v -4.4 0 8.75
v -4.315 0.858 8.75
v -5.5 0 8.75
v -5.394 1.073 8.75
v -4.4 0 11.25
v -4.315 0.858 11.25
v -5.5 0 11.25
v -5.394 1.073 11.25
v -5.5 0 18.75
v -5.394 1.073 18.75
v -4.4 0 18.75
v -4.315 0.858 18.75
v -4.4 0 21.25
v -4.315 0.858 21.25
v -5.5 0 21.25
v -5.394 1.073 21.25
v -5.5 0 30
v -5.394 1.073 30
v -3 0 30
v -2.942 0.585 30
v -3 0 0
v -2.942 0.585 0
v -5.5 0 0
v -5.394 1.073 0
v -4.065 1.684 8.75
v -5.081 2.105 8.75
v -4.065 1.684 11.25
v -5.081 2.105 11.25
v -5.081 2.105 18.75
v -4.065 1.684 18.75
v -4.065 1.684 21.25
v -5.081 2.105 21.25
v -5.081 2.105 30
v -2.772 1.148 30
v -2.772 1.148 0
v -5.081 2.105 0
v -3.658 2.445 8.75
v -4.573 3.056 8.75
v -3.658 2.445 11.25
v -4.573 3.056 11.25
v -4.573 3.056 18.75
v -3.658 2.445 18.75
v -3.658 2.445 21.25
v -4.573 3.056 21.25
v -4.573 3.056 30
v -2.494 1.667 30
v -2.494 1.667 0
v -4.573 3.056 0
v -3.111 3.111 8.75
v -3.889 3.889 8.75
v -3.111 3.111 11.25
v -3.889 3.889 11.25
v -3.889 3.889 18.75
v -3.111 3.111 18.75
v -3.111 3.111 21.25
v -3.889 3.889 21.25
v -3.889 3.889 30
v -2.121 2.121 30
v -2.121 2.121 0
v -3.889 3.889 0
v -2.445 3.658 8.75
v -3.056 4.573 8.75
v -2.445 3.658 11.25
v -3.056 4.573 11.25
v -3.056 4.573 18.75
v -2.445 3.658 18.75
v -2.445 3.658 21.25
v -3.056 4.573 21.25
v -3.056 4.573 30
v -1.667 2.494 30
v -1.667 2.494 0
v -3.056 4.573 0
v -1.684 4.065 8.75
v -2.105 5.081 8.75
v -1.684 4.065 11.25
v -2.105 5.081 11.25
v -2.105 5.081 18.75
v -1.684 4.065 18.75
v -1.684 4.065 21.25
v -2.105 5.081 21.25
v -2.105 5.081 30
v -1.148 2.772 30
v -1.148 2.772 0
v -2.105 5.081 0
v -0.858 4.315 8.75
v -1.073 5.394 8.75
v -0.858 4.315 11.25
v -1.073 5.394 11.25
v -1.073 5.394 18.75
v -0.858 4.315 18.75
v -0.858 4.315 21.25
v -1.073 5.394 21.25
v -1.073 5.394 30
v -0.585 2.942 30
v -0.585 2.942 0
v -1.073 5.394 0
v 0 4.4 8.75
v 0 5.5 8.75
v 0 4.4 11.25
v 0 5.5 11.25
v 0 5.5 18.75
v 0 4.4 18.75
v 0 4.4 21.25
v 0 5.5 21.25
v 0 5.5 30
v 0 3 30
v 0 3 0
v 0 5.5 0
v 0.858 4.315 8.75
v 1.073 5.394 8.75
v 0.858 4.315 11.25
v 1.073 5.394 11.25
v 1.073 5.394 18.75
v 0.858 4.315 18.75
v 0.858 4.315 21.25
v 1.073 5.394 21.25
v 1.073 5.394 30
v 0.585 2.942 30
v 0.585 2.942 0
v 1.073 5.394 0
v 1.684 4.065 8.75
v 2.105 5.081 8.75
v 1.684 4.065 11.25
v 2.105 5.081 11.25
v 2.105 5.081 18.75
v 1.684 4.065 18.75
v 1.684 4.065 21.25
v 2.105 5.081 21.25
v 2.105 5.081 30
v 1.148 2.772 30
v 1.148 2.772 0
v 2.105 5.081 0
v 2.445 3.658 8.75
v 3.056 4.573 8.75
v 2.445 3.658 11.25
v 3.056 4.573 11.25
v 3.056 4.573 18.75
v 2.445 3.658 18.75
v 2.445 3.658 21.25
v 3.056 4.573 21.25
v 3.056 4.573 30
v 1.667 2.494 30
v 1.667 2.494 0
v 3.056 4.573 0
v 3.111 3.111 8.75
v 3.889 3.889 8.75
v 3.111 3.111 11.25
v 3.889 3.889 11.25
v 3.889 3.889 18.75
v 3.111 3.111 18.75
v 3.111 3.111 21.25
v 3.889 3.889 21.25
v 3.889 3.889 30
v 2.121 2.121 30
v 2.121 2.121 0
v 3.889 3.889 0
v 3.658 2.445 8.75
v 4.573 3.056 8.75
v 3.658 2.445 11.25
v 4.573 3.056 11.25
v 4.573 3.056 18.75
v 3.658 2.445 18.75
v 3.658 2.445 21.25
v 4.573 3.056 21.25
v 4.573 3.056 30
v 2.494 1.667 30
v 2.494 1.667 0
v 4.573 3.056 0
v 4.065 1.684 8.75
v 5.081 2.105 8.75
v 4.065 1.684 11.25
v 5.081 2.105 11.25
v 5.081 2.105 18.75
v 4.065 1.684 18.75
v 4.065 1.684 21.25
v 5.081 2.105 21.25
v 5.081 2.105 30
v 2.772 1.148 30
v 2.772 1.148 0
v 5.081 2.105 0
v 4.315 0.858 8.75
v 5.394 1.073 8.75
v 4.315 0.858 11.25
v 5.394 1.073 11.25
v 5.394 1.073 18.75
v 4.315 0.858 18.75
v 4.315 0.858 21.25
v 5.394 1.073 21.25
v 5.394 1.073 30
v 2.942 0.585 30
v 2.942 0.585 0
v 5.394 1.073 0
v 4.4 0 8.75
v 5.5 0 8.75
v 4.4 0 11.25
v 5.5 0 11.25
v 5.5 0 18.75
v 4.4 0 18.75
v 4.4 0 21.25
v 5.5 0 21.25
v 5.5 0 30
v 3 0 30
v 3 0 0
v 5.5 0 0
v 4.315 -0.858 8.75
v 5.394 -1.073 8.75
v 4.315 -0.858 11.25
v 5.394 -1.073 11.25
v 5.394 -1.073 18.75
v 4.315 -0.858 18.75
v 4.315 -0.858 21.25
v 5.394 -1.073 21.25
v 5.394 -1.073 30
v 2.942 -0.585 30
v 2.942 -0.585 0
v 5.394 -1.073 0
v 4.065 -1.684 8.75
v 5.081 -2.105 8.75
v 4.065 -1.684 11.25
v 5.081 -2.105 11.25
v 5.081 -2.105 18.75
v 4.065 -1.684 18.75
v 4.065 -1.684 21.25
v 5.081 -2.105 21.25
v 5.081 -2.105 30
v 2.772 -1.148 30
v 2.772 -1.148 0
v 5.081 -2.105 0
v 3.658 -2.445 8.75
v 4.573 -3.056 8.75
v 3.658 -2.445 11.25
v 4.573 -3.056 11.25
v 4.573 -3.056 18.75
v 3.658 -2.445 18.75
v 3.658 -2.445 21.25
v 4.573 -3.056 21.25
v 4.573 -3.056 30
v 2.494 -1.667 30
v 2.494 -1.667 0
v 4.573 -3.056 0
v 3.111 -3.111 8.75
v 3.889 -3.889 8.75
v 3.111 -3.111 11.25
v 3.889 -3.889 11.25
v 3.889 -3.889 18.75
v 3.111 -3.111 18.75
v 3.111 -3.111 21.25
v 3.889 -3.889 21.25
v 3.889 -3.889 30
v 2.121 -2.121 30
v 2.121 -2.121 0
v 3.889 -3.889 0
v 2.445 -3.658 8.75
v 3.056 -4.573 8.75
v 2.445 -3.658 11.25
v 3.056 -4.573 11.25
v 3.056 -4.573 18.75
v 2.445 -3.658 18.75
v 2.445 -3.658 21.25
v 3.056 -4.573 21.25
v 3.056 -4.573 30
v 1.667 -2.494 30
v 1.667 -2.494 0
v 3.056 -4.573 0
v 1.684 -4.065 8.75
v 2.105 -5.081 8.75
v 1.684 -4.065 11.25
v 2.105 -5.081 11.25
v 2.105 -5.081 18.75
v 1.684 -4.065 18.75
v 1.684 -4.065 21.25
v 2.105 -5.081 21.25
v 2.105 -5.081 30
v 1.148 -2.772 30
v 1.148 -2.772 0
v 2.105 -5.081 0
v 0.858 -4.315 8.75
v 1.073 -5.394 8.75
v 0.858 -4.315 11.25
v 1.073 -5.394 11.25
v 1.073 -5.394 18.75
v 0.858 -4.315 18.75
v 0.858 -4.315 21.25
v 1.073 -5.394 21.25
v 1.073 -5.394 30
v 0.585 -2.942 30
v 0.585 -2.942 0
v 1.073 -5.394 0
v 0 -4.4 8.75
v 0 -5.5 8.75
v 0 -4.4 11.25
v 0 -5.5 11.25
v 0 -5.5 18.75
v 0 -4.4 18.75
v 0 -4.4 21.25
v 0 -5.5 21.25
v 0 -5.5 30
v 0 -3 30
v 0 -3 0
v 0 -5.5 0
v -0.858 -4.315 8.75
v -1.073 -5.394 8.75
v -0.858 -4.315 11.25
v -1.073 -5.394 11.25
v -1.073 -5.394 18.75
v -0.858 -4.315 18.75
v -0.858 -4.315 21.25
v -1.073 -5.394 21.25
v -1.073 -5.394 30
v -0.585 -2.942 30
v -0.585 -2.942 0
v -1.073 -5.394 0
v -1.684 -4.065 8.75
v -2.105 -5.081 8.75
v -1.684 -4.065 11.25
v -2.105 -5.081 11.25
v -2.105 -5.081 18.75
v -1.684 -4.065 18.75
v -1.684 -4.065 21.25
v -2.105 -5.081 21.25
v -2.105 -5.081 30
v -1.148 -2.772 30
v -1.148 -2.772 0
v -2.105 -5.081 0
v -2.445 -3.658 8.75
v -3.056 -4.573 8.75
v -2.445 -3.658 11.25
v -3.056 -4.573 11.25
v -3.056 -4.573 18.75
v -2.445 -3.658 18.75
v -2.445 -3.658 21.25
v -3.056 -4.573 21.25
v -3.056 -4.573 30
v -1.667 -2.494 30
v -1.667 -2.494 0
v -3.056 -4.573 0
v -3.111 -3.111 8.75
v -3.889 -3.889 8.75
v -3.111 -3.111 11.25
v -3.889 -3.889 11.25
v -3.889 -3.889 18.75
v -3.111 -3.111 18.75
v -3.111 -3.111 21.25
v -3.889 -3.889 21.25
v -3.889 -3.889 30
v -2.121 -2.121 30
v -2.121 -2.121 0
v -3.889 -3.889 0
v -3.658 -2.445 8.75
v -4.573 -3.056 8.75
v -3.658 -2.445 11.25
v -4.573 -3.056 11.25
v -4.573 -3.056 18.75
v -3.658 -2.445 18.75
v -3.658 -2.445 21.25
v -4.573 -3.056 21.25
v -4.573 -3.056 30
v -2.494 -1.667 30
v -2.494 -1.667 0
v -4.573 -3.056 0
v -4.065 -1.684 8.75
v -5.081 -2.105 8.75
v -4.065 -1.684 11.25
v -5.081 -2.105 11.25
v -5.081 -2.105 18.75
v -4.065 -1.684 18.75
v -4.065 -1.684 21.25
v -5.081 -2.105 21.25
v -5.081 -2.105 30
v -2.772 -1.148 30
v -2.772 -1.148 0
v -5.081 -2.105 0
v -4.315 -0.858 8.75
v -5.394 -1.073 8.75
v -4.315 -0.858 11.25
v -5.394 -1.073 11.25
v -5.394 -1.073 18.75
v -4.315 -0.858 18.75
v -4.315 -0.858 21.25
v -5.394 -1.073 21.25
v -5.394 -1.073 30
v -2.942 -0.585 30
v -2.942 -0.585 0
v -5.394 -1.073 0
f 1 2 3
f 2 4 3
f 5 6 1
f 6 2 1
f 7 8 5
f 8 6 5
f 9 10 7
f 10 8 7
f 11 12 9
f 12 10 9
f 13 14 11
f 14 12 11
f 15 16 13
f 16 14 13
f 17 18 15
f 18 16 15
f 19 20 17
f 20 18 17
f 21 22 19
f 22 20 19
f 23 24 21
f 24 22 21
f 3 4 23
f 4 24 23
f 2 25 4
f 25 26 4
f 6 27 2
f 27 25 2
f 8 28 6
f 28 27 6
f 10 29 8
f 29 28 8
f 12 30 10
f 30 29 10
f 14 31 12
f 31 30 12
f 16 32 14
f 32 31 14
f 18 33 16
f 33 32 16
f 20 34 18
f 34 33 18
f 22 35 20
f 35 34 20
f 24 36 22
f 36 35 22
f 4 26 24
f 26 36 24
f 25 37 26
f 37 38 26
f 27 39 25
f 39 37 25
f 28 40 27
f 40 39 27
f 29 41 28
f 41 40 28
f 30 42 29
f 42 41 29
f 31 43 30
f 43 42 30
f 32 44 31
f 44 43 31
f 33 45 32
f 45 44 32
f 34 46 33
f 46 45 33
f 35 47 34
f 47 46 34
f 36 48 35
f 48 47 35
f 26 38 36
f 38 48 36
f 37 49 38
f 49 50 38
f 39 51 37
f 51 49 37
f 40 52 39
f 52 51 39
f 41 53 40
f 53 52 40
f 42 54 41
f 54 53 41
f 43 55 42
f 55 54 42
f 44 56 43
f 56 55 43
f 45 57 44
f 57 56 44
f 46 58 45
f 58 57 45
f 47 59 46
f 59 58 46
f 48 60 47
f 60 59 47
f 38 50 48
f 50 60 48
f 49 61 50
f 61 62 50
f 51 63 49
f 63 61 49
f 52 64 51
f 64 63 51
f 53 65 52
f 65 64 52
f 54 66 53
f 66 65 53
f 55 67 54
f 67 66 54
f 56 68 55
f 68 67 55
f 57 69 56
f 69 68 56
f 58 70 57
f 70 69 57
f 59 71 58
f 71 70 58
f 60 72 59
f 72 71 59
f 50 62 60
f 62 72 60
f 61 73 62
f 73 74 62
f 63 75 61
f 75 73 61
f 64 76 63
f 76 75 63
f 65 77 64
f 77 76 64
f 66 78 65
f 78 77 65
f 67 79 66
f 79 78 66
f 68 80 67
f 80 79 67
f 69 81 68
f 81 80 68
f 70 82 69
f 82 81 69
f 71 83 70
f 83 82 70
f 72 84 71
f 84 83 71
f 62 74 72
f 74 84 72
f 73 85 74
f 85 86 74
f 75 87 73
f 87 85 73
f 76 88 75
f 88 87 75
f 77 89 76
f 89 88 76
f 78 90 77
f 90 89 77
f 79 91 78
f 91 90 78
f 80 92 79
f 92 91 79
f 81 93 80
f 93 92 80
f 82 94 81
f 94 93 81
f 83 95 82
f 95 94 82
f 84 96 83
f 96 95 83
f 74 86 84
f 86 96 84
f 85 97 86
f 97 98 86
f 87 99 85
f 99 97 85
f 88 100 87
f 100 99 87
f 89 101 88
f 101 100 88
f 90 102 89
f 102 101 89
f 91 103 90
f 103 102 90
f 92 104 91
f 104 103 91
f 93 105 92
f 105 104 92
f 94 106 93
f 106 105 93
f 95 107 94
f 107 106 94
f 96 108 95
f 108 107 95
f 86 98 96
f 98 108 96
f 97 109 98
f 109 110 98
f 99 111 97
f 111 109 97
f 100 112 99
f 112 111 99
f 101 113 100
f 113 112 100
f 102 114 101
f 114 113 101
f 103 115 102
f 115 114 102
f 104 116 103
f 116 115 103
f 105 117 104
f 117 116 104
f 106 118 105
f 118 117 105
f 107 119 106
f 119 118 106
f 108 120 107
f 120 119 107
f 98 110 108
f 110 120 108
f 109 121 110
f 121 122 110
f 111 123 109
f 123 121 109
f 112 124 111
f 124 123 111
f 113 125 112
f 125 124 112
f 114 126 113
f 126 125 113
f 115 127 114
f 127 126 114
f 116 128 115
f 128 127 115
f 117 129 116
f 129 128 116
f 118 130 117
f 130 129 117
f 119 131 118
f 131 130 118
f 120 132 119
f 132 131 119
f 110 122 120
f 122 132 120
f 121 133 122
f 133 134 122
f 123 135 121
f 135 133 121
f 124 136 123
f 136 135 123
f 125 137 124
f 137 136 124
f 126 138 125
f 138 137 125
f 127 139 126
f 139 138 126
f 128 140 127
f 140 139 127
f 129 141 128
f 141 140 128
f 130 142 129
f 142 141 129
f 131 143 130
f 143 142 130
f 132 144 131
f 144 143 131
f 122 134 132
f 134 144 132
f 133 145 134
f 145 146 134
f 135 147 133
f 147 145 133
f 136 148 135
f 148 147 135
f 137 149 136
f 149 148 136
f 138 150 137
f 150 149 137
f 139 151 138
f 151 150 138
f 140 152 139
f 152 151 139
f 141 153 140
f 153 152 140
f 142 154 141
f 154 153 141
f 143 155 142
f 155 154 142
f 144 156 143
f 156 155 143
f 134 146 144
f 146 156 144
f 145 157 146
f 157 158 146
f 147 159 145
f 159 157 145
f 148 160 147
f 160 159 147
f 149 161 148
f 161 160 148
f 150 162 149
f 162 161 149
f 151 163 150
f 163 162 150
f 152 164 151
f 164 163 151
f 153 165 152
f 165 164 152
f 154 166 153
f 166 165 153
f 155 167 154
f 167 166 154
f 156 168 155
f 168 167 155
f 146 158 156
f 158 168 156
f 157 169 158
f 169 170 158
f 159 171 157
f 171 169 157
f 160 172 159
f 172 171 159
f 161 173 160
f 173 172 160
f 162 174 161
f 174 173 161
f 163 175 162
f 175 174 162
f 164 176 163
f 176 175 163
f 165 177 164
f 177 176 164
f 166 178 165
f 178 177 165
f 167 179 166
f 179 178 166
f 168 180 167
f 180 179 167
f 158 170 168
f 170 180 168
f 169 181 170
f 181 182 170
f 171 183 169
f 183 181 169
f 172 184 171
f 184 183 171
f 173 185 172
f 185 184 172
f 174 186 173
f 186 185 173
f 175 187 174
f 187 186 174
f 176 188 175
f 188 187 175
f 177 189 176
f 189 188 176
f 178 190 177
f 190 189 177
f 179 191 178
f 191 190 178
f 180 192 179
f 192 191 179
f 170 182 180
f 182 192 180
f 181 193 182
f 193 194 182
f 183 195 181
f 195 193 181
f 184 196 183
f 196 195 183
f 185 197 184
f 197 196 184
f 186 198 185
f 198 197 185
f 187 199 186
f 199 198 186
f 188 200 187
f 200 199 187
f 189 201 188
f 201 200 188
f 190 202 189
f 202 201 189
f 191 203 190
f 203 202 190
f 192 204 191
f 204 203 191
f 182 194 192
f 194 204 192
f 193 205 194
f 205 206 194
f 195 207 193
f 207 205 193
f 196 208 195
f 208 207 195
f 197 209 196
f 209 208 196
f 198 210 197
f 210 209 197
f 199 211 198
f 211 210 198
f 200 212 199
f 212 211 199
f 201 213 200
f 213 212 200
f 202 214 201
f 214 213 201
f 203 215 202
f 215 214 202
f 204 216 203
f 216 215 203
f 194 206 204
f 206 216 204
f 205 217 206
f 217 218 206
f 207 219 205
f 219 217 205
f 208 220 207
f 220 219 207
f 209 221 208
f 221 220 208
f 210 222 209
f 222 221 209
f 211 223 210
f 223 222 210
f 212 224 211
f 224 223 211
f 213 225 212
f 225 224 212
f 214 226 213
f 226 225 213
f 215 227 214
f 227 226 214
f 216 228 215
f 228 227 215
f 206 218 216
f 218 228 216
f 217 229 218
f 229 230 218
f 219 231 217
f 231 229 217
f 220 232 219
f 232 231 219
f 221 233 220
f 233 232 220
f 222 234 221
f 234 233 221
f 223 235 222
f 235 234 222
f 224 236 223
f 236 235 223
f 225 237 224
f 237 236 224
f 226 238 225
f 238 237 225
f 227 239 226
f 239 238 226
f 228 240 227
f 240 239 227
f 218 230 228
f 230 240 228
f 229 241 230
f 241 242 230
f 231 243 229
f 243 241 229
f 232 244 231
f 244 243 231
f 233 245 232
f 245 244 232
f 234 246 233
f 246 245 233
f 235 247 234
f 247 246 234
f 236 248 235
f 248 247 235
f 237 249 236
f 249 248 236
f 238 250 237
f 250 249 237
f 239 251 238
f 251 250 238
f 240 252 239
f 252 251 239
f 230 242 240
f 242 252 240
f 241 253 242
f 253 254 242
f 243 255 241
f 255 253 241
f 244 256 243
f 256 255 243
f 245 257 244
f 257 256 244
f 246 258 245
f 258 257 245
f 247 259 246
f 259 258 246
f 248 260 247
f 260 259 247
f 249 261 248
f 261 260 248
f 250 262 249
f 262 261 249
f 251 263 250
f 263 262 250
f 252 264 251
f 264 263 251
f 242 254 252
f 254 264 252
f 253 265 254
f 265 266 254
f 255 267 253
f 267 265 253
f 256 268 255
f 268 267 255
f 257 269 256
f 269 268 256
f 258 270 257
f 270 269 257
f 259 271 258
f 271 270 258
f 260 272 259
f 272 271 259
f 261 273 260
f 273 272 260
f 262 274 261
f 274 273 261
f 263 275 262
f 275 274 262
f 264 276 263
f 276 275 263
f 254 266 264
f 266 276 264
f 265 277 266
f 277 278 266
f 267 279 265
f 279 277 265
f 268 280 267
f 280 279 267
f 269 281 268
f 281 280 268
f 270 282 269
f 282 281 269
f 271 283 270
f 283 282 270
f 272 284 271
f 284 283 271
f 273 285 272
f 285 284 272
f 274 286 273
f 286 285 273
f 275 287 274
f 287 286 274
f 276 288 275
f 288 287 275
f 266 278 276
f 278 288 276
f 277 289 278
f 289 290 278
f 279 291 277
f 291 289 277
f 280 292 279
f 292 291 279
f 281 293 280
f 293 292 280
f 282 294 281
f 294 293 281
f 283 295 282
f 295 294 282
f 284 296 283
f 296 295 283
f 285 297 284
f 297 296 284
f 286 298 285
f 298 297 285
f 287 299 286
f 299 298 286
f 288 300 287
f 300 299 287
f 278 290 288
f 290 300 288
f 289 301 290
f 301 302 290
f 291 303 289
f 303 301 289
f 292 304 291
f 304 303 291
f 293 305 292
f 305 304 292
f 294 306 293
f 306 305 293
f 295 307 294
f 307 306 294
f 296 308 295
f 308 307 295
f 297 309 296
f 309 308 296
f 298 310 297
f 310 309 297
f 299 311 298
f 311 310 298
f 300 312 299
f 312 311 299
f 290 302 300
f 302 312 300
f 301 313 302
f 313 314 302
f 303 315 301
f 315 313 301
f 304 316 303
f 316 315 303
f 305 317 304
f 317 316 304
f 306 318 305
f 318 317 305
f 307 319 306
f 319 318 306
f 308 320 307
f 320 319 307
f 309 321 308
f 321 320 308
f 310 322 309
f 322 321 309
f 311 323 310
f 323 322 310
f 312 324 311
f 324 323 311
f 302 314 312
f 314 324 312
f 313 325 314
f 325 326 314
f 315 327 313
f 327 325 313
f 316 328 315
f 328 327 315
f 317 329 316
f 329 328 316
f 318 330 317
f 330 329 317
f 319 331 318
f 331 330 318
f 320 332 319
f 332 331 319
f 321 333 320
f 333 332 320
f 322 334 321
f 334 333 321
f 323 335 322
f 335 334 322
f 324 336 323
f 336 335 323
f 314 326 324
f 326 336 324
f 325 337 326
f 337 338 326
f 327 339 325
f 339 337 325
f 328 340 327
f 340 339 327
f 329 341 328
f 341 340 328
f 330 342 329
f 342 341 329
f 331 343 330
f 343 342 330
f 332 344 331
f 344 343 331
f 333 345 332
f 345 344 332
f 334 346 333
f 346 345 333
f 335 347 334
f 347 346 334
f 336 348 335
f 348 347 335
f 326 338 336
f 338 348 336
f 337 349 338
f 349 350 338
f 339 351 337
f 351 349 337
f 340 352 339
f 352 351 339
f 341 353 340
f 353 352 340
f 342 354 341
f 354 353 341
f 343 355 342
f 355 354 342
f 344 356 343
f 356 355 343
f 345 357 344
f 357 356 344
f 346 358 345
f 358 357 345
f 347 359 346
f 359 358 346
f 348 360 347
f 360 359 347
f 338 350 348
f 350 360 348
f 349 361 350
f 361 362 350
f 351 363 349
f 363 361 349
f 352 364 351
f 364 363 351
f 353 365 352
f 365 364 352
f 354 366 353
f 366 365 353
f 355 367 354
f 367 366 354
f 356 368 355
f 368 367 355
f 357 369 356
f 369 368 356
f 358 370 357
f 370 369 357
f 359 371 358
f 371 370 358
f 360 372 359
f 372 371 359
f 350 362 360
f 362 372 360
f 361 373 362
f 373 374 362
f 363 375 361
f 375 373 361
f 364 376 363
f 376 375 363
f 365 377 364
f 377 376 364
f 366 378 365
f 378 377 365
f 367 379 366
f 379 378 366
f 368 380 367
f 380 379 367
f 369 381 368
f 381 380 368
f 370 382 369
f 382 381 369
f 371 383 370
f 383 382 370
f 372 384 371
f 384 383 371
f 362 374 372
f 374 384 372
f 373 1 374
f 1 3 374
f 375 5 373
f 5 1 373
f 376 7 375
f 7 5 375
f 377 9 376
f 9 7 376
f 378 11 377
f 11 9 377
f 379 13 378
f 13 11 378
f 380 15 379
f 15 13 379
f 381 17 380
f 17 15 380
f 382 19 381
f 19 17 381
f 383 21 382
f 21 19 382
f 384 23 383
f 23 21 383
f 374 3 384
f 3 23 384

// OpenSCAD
$fn = 32;

// ----------------------------------------------------------------------
// Grooved revolve: stepped, bore R3
// ----------------------------------------------------------------------

// --- parameters (mm) ---
bore_r = 3;               // bore radius
outer_r = 5.5;            // outer radius of the body
total_h = 30;             // overall height, Z
wall = 2.5;               // radial wall thickness
groove_w = 2.5;           // groove width
groove_d = 1.1;           // groove depth
grooves = 2;              // number of outer grooves

bbox_x = 2 * outer_r;  // full diameter
bore_d = 2 * bore_r;  // bore diameter
body_d = 2 * outer_r;  // body diameter
revolve_angle = 360;  // full turn around the Z axis

profile = [[3, 0], [5.5, 0], [5.5, 8.75], [4.4, 8.75], [4.4, 11.25], [5.5, 11.25], [5.5, 18.75], [4.4, 18.75], [4.4, 21.25], [5.5, 21.25], [5.5, 30], [3, 30]];  // primary outline, 12 points, counter clockwise

// --- the one profile operation ---
rotate_extrude(angle = revolve_angle) polygon(points = profile);
